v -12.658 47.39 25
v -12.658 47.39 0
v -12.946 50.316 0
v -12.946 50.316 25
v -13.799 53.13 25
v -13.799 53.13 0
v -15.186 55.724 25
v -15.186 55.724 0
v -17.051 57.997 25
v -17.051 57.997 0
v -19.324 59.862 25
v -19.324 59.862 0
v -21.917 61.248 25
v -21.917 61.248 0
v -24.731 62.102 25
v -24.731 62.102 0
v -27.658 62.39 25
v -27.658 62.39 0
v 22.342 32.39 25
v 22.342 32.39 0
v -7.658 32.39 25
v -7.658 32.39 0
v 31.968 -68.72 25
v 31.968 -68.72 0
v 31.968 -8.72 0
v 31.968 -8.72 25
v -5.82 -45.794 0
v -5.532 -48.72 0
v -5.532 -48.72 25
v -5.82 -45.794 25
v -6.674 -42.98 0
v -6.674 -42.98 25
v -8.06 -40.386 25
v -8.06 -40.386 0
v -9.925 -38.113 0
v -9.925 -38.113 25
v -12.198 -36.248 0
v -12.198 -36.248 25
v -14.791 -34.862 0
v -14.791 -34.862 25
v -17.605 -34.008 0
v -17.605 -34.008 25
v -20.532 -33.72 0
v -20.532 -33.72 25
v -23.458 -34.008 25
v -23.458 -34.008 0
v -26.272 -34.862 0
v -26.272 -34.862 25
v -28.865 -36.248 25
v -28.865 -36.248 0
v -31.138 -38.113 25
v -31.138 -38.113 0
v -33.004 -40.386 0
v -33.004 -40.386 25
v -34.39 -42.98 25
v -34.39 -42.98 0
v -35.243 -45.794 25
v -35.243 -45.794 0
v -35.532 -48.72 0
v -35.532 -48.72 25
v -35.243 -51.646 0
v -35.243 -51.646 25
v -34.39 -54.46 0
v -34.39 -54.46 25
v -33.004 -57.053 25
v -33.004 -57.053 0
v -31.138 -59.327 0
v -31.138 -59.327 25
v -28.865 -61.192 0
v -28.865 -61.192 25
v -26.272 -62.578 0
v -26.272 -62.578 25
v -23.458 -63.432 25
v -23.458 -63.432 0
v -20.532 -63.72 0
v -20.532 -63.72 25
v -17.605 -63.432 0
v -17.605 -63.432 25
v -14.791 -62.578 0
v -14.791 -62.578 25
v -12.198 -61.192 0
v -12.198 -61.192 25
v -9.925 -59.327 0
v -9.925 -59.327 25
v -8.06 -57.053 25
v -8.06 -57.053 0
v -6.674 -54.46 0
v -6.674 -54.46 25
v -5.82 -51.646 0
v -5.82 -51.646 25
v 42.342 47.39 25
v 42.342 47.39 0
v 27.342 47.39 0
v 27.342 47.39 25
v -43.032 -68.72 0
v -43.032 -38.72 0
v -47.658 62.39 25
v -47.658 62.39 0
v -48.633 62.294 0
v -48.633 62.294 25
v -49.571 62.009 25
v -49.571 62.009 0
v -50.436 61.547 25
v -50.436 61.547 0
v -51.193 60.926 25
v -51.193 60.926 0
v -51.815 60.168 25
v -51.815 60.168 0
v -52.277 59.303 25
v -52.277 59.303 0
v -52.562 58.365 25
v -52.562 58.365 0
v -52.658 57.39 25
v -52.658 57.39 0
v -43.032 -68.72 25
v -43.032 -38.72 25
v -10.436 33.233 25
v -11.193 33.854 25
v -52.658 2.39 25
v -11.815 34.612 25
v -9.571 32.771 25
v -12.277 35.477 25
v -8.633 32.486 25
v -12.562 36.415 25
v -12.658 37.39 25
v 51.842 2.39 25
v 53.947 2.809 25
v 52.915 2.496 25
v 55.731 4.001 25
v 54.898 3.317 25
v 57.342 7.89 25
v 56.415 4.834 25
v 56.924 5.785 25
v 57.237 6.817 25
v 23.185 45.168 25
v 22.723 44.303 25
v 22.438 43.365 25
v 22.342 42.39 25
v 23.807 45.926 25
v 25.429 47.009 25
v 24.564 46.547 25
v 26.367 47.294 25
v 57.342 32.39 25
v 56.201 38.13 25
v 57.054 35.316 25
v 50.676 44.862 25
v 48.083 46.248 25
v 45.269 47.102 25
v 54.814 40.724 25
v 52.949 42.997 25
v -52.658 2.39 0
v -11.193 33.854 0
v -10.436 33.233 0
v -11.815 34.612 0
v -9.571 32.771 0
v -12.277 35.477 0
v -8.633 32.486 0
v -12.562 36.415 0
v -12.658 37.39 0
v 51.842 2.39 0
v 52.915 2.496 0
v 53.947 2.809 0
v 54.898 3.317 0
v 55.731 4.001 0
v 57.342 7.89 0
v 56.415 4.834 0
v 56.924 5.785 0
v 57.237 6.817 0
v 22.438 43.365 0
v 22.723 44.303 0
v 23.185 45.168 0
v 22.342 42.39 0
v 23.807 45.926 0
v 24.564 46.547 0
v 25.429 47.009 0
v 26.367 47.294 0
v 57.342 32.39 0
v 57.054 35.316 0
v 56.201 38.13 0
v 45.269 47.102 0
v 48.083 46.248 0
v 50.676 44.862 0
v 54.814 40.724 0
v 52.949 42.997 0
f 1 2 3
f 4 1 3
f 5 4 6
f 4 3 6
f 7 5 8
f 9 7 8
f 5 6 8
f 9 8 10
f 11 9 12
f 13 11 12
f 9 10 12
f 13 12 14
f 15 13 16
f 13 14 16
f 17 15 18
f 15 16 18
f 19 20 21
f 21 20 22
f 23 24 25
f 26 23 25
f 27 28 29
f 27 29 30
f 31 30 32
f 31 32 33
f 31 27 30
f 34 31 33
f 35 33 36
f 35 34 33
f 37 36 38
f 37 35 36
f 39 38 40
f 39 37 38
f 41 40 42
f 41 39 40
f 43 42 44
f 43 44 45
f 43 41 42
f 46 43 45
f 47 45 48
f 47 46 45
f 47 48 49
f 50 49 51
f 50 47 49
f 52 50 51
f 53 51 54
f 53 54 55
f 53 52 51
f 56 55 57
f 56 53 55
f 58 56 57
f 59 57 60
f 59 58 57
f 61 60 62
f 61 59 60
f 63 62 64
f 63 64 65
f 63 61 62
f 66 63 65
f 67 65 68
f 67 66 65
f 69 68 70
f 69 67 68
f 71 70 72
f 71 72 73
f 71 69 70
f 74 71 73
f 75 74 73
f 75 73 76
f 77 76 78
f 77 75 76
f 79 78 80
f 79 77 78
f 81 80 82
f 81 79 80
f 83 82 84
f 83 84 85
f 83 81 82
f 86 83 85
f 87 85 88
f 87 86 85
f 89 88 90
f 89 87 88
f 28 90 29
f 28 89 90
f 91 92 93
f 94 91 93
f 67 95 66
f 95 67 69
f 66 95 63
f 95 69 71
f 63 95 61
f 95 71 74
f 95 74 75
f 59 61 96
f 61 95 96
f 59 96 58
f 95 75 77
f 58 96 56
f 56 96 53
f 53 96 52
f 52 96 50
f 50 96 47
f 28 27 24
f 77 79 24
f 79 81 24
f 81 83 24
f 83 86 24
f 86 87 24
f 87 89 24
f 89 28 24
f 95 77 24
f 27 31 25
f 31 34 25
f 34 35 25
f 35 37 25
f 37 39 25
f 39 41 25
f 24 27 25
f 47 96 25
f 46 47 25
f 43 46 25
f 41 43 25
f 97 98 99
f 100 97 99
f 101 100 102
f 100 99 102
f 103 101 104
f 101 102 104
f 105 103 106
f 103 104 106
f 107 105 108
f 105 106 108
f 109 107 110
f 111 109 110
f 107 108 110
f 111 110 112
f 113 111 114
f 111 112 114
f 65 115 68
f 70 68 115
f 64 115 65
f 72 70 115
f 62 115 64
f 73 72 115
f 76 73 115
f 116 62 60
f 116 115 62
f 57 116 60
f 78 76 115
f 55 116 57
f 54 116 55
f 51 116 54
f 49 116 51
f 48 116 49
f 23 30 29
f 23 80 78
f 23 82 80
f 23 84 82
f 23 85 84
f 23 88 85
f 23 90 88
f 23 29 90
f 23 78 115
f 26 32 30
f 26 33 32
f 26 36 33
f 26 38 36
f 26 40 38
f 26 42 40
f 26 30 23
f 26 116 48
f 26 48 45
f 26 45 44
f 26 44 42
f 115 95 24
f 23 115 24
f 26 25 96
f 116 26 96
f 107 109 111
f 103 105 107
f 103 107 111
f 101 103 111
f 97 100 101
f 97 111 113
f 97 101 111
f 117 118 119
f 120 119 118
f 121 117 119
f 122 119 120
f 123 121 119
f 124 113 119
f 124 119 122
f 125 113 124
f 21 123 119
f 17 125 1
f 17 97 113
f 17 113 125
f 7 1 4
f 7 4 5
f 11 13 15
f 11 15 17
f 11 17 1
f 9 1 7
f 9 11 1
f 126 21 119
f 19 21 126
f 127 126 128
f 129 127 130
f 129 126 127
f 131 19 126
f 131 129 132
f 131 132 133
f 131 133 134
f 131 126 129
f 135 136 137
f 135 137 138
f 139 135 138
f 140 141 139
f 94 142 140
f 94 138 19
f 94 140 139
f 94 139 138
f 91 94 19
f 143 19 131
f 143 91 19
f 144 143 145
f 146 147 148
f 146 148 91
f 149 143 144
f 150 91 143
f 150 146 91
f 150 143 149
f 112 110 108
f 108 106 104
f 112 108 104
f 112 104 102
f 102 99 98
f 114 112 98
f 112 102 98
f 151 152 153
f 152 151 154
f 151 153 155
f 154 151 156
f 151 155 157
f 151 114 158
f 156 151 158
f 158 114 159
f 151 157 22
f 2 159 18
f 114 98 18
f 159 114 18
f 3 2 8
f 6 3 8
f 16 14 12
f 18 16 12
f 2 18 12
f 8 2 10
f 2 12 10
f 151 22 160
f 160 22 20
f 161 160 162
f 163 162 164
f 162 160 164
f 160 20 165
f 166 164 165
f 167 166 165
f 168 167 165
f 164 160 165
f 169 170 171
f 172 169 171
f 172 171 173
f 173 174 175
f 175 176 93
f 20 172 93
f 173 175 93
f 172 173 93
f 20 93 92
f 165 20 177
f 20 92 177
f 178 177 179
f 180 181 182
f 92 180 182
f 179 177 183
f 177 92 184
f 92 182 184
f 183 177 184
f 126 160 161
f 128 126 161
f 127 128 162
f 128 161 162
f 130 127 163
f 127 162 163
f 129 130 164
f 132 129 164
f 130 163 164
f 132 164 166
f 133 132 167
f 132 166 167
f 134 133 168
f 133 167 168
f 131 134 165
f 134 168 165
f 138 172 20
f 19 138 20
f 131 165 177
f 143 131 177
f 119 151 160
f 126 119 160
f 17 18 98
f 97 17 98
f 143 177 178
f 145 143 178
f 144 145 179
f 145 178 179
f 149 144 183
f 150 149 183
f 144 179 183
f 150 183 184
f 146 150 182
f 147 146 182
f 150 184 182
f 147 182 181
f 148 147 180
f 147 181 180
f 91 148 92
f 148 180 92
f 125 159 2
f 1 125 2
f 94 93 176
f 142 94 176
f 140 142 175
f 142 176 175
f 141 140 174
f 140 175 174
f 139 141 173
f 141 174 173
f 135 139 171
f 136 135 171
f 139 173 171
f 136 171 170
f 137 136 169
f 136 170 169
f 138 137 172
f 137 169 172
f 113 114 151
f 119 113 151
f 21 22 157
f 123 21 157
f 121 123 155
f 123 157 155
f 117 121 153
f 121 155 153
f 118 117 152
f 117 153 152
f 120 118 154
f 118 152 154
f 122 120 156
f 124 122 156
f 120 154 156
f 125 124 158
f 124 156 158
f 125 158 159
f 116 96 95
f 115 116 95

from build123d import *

# Parameters (mm, degrees)
F0_R     = 15
F1_DEPTH = 25


with BuildPart() as f1:
    # F0 (on Top) → F1 (new body)
    with BuildSketch(Plane.XY):
        with BuildLine():
            Line((-52.657656, 57.389982), (-52.657656, 2.389982))
            Line((-52.657656, 2.389982), (51.842344, 2.389982))
            ThreePointArc((51.842344, 2.389982), (55.731431, 4.000894), (57.342344, 7.889982))
            Line((57.342344, 7.889982), (57.342344, 32.389982))
            ThreePointArc((57.342344, 32.389982), (52.948945, 42.996583), (42.342344, 47.389982))
            Line((42.342344, 47.389982), (27.342344, 47.389982))
            ThreePointArc((27.342344, 47.389982), (23.80681, 45.925515), (22.342344, 42.389982))
            Line((22.342344, 42.389982), (22.342344, 32.389982))
            Line((22.342344, 32.389982), (-7.657656, 32.389982))
            ThreePointArc((-7.657656, 32.389982), (-11.19319, 33.854448), (-12.657656, 37.389982))
            Line((-12.657656, 37.389982), (-12.657656, 47.389982))
            ThreePointArc((-12.657656, 47.389982), (-17.051055, 57.996583), (-27.657656, 62.389982))
            Line((-27.657656, 62.389982), (-47.657656, 62.389982))
            ThreePointArc((-47.657656, 62.389982), (-51.19319, 60.925515), (-52.657656, 57.389982))
        make_face()
        Polygon((-43.031711, -38.719946), (-43.031711, -68.719946), (31.968289, -68.719946), (31.968289, -8.719946), align=None)
        with Locations((-20.531711, -48.719946)):
            Circle(F0_R, mode=Mode.SUBTRACT)
    extrude(amount=F1_DEPTH)


solid = f1.part
